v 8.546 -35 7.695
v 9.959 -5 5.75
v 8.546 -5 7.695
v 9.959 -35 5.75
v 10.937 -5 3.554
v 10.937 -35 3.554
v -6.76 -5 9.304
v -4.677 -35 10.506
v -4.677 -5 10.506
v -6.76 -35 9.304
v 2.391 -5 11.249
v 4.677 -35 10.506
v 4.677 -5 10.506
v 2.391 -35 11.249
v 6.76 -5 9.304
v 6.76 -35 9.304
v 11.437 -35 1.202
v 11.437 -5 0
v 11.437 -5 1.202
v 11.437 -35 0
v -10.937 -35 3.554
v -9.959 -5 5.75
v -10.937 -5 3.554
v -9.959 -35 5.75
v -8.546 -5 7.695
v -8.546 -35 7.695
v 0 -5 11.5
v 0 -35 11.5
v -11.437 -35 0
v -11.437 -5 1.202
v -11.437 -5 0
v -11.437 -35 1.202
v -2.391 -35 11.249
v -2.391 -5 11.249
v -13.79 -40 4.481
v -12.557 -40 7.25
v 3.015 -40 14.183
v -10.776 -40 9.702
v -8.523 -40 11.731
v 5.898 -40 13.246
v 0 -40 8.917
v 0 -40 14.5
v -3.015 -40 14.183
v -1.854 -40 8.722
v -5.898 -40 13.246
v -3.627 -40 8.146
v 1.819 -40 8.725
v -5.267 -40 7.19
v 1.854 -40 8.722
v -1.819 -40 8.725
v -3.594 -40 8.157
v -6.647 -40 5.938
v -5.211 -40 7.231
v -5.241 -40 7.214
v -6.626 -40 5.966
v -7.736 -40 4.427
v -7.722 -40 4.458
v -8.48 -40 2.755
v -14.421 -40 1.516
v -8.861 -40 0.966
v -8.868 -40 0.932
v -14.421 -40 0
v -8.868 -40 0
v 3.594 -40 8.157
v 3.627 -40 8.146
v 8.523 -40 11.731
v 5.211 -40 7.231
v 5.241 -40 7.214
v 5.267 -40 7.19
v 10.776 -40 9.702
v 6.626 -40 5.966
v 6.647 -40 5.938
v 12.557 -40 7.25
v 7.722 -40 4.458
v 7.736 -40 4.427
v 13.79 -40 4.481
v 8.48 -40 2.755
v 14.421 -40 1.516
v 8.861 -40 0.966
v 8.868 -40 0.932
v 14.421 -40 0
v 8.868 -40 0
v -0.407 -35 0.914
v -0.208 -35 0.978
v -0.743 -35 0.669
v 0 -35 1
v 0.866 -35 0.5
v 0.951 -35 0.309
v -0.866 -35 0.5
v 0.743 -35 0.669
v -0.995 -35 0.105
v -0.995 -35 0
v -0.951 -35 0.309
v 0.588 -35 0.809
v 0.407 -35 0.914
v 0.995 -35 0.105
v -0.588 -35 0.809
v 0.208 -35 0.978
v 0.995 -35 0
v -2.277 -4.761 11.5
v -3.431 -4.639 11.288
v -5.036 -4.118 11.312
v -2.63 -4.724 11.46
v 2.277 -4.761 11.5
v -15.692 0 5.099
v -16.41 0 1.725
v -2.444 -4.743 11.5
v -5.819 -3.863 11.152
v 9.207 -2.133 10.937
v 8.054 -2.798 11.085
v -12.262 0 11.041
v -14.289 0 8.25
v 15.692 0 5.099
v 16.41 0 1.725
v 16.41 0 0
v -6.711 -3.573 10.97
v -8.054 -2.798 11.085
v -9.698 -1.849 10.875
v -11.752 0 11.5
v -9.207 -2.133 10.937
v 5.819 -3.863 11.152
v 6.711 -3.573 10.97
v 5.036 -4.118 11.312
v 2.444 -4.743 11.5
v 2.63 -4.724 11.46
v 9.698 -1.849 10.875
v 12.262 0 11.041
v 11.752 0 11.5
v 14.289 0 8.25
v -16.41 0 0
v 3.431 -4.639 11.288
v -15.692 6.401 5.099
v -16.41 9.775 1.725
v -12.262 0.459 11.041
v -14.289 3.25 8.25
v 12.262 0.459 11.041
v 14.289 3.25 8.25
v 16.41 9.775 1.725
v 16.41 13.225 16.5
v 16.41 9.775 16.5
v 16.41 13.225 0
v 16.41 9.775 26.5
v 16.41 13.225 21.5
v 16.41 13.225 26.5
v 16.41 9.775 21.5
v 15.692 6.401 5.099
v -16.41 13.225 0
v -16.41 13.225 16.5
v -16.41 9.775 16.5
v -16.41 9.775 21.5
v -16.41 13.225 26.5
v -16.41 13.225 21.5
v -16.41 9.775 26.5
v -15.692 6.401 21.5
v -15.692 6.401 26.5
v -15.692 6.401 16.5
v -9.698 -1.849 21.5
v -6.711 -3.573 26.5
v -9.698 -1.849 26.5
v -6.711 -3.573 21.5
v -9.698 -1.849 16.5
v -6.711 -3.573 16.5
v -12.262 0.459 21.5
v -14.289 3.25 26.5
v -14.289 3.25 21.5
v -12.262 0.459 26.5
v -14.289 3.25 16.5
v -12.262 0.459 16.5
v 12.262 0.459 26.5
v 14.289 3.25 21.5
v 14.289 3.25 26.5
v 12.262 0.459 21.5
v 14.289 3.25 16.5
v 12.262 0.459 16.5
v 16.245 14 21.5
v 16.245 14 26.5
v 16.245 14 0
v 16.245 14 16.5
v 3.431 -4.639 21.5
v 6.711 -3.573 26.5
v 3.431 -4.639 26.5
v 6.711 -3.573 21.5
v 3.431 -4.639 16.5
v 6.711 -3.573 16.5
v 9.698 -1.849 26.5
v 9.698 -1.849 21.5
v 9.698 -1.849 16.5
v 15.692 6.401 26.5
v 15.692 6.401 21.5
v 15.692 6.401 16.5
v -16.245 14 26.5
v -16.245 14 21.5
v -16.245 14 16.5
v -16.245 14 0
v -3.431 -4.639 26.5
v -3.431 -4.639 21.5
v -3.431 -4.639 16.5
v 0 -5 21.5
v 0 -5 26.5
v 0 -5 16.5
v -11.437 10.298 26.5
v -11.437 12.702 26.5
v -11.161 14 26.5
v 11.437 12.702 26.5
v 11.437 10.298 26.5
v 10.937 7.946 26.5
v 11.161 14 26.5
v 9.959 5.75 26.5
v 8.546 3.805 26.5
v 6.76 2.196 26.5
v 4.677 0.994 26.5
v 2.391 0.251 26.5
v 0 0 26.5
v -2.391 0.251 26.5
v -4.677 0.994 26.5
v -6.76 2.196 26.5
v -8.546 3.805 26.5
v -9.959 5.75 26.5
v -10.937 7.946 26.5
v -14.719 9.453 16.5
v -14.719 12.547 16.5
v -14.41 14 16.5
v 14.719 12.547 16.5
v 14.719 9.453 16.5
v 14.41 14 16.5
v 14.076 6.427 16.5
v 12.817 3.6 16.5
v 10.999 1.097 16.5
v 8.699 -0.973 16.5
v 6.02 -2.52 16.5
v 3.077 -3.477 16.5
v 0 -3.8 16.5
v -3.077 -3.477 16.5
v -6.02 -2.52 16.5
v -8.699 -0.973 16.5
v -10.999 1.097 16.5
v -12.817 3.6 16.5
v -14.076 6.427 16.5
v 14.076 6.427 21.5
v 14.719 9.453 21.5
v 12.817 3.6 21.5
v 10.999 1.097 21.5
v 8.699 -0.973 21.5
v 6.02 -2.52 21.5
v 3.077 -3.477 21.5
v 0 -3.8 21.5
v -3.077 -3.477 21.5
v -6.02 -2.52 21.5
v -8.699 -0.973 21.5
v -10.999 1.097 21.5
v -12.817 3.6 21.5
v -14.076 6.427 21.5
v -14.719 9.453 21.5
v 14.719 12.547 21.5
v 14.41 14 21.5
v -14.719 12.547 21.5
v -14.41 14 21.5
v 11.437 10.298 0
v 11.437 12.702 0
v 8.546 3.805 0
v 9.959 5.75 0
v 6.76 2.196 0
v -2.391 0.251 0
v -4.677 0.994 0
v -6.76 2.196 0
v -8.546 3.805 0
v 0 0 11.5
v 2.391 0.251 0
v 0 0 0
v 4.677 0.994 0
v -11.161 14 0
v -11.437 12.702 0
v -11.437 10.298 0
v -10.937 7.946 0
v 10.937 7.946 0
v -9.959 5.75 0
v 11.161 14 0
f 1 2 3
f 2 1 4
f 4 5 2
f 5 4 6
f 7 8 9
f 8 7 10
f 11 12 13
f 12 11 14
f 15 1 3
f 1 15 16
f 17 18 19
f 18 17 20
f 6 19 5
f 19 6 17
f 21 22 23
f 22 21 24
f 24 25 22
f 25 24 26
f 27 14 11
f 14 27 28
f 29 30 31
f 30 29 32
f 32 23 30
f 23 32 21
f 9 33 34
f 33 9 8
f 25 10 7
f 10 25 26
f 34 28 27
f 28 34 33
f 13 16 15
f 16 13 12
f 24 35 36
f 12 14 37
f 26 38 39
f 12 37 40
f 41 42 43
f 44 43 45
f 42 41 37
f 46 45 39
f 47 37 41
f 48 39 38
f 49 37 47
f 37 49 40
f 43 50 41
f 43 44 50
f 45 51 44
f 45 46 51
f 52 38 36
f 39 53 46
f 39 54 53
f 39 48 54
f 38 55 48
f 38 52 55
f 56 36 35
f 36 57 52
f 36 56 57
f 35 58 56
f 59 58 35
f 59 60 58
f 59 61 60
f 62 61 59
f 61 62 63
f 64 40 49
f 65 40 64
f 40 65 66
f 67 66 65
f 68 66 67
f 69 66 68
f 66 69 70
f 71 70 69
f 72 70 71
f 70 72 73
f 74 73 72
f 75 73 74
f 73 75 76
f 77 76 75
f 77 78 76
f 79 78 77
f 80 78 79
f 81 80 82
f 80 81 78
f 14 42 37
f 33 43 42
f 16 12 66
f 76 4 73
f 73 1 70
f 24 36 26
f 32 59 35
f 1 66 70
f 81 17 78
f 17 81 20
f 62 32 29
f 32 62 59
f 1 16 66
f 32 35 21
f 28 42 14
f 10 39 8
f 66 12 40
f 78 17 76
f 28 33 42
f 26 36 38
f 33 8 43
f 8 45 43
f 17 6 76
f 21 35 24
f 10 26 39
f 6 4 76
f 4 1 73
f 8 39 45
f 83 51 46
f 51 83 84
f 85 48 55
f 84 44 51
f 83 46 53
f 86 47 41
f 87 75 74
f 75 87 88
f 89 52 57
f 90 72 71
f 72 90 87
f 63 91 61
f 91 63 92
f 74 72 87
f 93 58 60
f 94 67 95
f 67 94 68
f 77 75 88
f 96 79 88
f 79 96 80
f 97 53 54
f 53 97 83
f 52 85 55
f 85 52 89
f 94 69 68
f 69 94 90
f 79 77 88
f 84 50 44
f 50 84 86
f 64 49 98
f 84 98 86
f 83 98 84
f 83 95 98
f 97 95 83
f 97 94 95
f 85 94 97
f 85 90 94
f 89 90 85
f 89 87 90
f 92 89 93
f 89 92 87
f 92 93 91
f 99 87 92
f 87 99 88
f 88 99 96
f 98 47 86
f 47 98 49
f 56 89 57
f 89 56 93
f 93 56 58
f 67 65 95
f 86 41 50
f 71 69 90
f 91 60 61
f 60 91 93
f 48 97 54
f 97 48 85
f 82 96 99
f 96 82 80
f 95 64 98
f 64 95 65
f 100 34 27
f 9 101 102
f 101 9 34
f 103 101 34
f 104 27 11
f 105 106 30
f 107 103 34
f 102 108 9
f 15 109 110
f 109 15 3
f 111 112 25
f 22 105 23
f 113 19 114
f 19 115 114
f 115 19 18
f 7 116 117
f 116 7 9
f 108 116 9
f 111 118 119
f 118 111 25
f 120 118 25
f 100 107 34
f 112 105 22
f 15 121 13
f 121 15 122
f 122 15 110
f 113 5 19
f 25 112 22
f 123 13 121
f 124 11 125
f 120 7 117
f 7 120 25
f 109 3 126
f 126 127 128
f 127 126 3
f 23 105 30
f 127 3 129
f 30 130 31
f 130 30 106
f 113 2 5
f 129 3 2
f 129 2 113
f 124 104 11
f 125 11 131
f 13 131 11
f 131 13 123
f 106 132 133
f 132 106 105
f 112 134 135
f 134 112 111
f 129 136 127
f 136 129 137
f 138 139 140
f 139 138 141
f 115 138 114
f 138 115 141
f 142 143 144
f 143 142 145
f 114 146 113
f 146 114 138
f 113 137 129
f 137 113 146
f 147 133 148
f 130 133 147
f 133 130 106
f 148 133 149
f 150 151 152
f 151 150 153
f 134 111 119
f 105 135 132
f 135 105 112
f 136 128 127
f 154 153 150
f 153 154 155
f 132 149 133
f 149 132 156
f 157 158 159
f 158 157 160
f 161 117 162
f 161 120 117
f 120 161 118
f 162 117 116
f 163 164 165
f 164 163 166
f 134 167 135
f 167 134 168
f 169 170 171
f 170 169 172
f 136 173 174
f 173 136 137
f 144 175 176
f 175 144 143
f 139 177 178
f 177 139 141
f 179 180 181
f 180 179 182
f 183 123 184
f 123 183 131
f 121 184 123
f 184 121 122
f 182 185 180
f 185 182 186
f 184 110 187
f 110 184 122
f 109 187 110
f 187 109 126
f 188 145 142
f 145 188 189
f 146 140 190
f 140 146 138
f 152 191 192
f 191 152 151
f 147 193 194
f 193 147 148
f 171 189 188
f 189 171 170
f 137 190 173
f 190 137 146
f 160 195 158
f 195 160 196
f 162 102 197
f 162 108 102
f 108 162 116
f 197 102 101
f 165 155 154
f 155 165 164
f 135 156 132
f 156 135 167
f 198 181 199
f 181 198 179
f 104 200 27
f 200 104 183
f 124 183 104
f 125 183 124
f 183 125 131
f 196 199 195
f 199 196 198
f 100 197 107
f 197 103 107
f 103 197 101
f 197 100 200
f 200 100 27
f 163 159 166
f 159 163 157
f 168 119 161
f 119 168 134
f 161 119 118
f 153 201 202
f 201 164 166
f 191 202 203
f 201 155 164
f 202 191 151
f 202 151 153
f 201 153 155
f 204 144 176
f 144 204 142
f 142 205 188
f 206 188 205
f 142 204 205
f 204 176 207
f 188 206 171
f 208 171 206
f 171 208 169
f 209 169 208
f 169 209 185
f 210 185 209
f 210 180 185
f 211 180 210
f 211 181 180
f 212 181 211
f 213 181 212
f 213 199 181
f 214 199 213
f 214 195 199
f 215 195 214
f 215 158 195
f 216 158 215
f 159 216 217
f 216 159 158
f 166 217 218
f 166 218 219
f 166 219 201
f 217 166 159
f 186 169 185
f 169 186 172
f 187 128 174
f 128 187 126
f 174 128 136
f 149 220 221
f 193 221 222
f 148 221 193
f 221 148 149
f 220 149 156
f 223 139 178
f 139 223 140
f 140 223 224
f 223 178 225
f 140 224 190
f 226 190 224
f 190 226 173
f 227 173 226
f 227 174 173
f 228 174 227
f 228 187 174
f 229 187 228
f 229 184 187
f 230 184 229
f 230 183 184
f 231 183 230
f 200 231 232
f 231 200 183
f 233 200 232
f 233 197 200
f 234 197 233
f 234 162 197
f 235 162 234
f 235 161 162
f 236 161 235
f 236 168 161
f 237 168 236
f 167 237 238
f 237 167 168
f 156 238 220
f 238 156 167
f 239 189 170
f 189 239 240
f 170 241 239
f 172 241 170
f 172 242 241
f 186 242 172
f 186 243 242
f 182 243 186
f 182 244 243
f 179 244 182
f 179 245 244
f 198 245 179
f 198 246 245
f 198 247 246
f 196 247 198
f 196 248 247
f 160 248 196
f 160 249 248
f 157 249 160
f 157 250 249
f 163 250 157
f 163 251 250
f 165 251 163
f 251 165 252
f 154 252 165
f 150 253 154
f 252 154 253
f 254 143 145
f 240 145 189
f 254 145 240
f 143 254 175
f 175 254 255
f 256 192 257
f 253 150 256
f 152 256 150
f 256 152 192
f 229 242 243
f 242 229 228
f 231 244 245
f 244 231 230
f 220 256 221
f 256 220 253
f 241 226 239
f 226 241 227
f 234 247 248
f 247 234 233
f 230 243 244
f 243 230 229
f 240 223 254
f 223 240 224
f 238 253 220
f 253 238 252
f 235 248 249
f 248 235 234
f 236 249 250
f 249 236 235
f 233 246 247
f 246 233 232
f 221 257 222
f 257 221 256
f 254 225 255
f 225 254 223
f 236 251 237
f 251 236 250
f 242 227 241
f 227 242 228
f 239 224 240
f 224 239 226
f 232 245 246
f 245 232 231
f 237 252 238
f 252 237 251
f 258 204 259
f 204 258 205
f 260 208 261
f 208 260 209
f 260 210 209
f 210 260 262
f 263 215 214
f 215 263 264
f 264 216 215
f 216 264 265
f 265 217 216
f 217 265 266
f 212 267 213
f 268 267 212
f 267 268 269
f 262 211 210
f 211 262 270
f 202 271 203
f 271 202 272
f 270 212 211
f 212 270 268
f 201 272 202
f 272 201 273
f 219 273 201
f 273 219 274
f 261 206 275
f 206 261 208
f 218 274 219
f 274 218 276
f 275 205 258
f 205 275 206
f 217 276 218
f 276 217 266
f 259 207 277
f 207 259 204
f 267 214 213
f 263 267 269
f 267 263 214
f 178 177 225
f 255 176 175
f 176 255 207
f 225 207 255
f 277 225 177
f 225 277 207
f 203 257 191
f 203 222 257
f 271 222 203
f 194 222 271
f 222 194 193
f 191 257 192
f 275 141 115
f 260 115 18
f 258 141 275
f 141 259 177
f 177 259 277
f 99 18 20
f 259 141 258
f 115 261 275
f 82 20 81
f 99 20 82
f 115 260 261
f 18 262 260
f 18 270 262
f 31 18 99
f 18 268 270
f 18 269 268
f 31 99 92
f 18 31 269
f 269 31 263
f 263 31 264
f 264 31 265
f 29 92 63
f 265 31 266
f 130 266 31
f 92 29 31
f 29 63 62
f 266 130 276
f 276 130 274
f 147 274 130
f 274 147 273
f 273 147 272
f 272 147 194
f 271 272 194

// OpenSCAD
//  Right angle bike light holder
//  Copyright 2011 John Cooper 
//
//  This program is free software: you can redistribute it and/or modify
//  it under the terms of the GNU General Public License as published by
//  the Free Software Foundation, either version 3 of the License, or
//   (at your option) any later version.
//
//  This program is distributed in the hope that it will be useful,
//  but WITHOUT ANY WARRANTY; without even the implied warranty of
//  MERCHANTABILITY or FITNESS FOR A PARTICULAR PURPOSE.  See the
//  GNU General Public License for more details.
//
//  You should have received a copy of the GNU General Public License
//  along with this program.  If not, see <http://www.gnu.org/licenses/>.

bar_diameter = 23;
bar_radius = bar_diameter / 2;
clamp_width = 35;
cover_thickness = 5;
outer_cover_radius = bar_radius +  cover_thickness  ;
cover_length = bar_diameter + 30;
tiewrap_width=5;
tiewrap_depth=1.7;

module tube (length, outer_r, inner_r) {
    difference () {
        cylinder (h=length, r1=outer_r, r2=outer_r);
        translate ([-0.5,0,0]) {
            cylinder (h=length + 1, r1=inner_r, r2=inner_r);
        }
    }
}

module full_stand () {
union () {
difference () {
    union () {
        cylinder (h=clamp_width,r1=bar_radius,r2=bar_radius);
        translate ([0,0,clamp_width]){
            cylinder (h=5, r1=bar_radius, r2=bar_radius + 3);
        }
    }
    translate ([0,0,clamp_width]) {
        cylinder (h=6, r1=1, r2=bar_radius - 1);
    }
}

difference () {
    union () {
        cylinder(h=cover_thickness,r1=outer_cover_radius, r2=bar_radius );
        translate ([0,0,-bar_radius]) {
            cylinder(h=bar_radius,r1=outer_cover_radius, r2=outer_cover_radius);
        }

        translate ([- cover_length /2, 0, -bar_radius]) {
            rotate ([0,90,0]) {
                 cylinder (h=cover_length, r1=outer_cover_radius, r2=outer_cover_radius);
            }
        }
    }
    translate ([- cover_length / 2 -0.5, 0, -bar_radius]) {
        rotate ([0,90,0]) {
            cylinder(h=cover_length+1, r1=bar_radius, r2=bar_radius);
        }
    }
    translate ([-cover_length/2 - 0.5,-outer_cover_radius, -(outer_cover_radius * 2 - cover_thickness / 2 )]) {
        cube ([cover_length+1, outer_cover_radius * 2, outer_cover_radius]);
    }
    translate ([cover_length/2 - tiewrap_width * 2  ,0, -bar_radius]) {
        rotate([0,90,0]) {
            tube(length=tiewrap_width, inner_r=outer_cover_radius - tiewrap_depth, outer_r=outer_cover_radius + 1);
        }
    }
    translate ([-(cover_length / 2 - tiewrap_width ) ,0, -bar_radius]) {
        rotate([0,90,0]) {
            tube(length=tiewrap_width, inner_r=outer_cover_radius - tiewrap_depth, outer_r=outer_cover_radius + 1);
        }
    }
}
}
}

difference () {
    rotate([90,90,0]) {
        full_stand ();
    }
    translate ([-50,-50,-100]) {
        cube ([100,100,100]);
    }
}
